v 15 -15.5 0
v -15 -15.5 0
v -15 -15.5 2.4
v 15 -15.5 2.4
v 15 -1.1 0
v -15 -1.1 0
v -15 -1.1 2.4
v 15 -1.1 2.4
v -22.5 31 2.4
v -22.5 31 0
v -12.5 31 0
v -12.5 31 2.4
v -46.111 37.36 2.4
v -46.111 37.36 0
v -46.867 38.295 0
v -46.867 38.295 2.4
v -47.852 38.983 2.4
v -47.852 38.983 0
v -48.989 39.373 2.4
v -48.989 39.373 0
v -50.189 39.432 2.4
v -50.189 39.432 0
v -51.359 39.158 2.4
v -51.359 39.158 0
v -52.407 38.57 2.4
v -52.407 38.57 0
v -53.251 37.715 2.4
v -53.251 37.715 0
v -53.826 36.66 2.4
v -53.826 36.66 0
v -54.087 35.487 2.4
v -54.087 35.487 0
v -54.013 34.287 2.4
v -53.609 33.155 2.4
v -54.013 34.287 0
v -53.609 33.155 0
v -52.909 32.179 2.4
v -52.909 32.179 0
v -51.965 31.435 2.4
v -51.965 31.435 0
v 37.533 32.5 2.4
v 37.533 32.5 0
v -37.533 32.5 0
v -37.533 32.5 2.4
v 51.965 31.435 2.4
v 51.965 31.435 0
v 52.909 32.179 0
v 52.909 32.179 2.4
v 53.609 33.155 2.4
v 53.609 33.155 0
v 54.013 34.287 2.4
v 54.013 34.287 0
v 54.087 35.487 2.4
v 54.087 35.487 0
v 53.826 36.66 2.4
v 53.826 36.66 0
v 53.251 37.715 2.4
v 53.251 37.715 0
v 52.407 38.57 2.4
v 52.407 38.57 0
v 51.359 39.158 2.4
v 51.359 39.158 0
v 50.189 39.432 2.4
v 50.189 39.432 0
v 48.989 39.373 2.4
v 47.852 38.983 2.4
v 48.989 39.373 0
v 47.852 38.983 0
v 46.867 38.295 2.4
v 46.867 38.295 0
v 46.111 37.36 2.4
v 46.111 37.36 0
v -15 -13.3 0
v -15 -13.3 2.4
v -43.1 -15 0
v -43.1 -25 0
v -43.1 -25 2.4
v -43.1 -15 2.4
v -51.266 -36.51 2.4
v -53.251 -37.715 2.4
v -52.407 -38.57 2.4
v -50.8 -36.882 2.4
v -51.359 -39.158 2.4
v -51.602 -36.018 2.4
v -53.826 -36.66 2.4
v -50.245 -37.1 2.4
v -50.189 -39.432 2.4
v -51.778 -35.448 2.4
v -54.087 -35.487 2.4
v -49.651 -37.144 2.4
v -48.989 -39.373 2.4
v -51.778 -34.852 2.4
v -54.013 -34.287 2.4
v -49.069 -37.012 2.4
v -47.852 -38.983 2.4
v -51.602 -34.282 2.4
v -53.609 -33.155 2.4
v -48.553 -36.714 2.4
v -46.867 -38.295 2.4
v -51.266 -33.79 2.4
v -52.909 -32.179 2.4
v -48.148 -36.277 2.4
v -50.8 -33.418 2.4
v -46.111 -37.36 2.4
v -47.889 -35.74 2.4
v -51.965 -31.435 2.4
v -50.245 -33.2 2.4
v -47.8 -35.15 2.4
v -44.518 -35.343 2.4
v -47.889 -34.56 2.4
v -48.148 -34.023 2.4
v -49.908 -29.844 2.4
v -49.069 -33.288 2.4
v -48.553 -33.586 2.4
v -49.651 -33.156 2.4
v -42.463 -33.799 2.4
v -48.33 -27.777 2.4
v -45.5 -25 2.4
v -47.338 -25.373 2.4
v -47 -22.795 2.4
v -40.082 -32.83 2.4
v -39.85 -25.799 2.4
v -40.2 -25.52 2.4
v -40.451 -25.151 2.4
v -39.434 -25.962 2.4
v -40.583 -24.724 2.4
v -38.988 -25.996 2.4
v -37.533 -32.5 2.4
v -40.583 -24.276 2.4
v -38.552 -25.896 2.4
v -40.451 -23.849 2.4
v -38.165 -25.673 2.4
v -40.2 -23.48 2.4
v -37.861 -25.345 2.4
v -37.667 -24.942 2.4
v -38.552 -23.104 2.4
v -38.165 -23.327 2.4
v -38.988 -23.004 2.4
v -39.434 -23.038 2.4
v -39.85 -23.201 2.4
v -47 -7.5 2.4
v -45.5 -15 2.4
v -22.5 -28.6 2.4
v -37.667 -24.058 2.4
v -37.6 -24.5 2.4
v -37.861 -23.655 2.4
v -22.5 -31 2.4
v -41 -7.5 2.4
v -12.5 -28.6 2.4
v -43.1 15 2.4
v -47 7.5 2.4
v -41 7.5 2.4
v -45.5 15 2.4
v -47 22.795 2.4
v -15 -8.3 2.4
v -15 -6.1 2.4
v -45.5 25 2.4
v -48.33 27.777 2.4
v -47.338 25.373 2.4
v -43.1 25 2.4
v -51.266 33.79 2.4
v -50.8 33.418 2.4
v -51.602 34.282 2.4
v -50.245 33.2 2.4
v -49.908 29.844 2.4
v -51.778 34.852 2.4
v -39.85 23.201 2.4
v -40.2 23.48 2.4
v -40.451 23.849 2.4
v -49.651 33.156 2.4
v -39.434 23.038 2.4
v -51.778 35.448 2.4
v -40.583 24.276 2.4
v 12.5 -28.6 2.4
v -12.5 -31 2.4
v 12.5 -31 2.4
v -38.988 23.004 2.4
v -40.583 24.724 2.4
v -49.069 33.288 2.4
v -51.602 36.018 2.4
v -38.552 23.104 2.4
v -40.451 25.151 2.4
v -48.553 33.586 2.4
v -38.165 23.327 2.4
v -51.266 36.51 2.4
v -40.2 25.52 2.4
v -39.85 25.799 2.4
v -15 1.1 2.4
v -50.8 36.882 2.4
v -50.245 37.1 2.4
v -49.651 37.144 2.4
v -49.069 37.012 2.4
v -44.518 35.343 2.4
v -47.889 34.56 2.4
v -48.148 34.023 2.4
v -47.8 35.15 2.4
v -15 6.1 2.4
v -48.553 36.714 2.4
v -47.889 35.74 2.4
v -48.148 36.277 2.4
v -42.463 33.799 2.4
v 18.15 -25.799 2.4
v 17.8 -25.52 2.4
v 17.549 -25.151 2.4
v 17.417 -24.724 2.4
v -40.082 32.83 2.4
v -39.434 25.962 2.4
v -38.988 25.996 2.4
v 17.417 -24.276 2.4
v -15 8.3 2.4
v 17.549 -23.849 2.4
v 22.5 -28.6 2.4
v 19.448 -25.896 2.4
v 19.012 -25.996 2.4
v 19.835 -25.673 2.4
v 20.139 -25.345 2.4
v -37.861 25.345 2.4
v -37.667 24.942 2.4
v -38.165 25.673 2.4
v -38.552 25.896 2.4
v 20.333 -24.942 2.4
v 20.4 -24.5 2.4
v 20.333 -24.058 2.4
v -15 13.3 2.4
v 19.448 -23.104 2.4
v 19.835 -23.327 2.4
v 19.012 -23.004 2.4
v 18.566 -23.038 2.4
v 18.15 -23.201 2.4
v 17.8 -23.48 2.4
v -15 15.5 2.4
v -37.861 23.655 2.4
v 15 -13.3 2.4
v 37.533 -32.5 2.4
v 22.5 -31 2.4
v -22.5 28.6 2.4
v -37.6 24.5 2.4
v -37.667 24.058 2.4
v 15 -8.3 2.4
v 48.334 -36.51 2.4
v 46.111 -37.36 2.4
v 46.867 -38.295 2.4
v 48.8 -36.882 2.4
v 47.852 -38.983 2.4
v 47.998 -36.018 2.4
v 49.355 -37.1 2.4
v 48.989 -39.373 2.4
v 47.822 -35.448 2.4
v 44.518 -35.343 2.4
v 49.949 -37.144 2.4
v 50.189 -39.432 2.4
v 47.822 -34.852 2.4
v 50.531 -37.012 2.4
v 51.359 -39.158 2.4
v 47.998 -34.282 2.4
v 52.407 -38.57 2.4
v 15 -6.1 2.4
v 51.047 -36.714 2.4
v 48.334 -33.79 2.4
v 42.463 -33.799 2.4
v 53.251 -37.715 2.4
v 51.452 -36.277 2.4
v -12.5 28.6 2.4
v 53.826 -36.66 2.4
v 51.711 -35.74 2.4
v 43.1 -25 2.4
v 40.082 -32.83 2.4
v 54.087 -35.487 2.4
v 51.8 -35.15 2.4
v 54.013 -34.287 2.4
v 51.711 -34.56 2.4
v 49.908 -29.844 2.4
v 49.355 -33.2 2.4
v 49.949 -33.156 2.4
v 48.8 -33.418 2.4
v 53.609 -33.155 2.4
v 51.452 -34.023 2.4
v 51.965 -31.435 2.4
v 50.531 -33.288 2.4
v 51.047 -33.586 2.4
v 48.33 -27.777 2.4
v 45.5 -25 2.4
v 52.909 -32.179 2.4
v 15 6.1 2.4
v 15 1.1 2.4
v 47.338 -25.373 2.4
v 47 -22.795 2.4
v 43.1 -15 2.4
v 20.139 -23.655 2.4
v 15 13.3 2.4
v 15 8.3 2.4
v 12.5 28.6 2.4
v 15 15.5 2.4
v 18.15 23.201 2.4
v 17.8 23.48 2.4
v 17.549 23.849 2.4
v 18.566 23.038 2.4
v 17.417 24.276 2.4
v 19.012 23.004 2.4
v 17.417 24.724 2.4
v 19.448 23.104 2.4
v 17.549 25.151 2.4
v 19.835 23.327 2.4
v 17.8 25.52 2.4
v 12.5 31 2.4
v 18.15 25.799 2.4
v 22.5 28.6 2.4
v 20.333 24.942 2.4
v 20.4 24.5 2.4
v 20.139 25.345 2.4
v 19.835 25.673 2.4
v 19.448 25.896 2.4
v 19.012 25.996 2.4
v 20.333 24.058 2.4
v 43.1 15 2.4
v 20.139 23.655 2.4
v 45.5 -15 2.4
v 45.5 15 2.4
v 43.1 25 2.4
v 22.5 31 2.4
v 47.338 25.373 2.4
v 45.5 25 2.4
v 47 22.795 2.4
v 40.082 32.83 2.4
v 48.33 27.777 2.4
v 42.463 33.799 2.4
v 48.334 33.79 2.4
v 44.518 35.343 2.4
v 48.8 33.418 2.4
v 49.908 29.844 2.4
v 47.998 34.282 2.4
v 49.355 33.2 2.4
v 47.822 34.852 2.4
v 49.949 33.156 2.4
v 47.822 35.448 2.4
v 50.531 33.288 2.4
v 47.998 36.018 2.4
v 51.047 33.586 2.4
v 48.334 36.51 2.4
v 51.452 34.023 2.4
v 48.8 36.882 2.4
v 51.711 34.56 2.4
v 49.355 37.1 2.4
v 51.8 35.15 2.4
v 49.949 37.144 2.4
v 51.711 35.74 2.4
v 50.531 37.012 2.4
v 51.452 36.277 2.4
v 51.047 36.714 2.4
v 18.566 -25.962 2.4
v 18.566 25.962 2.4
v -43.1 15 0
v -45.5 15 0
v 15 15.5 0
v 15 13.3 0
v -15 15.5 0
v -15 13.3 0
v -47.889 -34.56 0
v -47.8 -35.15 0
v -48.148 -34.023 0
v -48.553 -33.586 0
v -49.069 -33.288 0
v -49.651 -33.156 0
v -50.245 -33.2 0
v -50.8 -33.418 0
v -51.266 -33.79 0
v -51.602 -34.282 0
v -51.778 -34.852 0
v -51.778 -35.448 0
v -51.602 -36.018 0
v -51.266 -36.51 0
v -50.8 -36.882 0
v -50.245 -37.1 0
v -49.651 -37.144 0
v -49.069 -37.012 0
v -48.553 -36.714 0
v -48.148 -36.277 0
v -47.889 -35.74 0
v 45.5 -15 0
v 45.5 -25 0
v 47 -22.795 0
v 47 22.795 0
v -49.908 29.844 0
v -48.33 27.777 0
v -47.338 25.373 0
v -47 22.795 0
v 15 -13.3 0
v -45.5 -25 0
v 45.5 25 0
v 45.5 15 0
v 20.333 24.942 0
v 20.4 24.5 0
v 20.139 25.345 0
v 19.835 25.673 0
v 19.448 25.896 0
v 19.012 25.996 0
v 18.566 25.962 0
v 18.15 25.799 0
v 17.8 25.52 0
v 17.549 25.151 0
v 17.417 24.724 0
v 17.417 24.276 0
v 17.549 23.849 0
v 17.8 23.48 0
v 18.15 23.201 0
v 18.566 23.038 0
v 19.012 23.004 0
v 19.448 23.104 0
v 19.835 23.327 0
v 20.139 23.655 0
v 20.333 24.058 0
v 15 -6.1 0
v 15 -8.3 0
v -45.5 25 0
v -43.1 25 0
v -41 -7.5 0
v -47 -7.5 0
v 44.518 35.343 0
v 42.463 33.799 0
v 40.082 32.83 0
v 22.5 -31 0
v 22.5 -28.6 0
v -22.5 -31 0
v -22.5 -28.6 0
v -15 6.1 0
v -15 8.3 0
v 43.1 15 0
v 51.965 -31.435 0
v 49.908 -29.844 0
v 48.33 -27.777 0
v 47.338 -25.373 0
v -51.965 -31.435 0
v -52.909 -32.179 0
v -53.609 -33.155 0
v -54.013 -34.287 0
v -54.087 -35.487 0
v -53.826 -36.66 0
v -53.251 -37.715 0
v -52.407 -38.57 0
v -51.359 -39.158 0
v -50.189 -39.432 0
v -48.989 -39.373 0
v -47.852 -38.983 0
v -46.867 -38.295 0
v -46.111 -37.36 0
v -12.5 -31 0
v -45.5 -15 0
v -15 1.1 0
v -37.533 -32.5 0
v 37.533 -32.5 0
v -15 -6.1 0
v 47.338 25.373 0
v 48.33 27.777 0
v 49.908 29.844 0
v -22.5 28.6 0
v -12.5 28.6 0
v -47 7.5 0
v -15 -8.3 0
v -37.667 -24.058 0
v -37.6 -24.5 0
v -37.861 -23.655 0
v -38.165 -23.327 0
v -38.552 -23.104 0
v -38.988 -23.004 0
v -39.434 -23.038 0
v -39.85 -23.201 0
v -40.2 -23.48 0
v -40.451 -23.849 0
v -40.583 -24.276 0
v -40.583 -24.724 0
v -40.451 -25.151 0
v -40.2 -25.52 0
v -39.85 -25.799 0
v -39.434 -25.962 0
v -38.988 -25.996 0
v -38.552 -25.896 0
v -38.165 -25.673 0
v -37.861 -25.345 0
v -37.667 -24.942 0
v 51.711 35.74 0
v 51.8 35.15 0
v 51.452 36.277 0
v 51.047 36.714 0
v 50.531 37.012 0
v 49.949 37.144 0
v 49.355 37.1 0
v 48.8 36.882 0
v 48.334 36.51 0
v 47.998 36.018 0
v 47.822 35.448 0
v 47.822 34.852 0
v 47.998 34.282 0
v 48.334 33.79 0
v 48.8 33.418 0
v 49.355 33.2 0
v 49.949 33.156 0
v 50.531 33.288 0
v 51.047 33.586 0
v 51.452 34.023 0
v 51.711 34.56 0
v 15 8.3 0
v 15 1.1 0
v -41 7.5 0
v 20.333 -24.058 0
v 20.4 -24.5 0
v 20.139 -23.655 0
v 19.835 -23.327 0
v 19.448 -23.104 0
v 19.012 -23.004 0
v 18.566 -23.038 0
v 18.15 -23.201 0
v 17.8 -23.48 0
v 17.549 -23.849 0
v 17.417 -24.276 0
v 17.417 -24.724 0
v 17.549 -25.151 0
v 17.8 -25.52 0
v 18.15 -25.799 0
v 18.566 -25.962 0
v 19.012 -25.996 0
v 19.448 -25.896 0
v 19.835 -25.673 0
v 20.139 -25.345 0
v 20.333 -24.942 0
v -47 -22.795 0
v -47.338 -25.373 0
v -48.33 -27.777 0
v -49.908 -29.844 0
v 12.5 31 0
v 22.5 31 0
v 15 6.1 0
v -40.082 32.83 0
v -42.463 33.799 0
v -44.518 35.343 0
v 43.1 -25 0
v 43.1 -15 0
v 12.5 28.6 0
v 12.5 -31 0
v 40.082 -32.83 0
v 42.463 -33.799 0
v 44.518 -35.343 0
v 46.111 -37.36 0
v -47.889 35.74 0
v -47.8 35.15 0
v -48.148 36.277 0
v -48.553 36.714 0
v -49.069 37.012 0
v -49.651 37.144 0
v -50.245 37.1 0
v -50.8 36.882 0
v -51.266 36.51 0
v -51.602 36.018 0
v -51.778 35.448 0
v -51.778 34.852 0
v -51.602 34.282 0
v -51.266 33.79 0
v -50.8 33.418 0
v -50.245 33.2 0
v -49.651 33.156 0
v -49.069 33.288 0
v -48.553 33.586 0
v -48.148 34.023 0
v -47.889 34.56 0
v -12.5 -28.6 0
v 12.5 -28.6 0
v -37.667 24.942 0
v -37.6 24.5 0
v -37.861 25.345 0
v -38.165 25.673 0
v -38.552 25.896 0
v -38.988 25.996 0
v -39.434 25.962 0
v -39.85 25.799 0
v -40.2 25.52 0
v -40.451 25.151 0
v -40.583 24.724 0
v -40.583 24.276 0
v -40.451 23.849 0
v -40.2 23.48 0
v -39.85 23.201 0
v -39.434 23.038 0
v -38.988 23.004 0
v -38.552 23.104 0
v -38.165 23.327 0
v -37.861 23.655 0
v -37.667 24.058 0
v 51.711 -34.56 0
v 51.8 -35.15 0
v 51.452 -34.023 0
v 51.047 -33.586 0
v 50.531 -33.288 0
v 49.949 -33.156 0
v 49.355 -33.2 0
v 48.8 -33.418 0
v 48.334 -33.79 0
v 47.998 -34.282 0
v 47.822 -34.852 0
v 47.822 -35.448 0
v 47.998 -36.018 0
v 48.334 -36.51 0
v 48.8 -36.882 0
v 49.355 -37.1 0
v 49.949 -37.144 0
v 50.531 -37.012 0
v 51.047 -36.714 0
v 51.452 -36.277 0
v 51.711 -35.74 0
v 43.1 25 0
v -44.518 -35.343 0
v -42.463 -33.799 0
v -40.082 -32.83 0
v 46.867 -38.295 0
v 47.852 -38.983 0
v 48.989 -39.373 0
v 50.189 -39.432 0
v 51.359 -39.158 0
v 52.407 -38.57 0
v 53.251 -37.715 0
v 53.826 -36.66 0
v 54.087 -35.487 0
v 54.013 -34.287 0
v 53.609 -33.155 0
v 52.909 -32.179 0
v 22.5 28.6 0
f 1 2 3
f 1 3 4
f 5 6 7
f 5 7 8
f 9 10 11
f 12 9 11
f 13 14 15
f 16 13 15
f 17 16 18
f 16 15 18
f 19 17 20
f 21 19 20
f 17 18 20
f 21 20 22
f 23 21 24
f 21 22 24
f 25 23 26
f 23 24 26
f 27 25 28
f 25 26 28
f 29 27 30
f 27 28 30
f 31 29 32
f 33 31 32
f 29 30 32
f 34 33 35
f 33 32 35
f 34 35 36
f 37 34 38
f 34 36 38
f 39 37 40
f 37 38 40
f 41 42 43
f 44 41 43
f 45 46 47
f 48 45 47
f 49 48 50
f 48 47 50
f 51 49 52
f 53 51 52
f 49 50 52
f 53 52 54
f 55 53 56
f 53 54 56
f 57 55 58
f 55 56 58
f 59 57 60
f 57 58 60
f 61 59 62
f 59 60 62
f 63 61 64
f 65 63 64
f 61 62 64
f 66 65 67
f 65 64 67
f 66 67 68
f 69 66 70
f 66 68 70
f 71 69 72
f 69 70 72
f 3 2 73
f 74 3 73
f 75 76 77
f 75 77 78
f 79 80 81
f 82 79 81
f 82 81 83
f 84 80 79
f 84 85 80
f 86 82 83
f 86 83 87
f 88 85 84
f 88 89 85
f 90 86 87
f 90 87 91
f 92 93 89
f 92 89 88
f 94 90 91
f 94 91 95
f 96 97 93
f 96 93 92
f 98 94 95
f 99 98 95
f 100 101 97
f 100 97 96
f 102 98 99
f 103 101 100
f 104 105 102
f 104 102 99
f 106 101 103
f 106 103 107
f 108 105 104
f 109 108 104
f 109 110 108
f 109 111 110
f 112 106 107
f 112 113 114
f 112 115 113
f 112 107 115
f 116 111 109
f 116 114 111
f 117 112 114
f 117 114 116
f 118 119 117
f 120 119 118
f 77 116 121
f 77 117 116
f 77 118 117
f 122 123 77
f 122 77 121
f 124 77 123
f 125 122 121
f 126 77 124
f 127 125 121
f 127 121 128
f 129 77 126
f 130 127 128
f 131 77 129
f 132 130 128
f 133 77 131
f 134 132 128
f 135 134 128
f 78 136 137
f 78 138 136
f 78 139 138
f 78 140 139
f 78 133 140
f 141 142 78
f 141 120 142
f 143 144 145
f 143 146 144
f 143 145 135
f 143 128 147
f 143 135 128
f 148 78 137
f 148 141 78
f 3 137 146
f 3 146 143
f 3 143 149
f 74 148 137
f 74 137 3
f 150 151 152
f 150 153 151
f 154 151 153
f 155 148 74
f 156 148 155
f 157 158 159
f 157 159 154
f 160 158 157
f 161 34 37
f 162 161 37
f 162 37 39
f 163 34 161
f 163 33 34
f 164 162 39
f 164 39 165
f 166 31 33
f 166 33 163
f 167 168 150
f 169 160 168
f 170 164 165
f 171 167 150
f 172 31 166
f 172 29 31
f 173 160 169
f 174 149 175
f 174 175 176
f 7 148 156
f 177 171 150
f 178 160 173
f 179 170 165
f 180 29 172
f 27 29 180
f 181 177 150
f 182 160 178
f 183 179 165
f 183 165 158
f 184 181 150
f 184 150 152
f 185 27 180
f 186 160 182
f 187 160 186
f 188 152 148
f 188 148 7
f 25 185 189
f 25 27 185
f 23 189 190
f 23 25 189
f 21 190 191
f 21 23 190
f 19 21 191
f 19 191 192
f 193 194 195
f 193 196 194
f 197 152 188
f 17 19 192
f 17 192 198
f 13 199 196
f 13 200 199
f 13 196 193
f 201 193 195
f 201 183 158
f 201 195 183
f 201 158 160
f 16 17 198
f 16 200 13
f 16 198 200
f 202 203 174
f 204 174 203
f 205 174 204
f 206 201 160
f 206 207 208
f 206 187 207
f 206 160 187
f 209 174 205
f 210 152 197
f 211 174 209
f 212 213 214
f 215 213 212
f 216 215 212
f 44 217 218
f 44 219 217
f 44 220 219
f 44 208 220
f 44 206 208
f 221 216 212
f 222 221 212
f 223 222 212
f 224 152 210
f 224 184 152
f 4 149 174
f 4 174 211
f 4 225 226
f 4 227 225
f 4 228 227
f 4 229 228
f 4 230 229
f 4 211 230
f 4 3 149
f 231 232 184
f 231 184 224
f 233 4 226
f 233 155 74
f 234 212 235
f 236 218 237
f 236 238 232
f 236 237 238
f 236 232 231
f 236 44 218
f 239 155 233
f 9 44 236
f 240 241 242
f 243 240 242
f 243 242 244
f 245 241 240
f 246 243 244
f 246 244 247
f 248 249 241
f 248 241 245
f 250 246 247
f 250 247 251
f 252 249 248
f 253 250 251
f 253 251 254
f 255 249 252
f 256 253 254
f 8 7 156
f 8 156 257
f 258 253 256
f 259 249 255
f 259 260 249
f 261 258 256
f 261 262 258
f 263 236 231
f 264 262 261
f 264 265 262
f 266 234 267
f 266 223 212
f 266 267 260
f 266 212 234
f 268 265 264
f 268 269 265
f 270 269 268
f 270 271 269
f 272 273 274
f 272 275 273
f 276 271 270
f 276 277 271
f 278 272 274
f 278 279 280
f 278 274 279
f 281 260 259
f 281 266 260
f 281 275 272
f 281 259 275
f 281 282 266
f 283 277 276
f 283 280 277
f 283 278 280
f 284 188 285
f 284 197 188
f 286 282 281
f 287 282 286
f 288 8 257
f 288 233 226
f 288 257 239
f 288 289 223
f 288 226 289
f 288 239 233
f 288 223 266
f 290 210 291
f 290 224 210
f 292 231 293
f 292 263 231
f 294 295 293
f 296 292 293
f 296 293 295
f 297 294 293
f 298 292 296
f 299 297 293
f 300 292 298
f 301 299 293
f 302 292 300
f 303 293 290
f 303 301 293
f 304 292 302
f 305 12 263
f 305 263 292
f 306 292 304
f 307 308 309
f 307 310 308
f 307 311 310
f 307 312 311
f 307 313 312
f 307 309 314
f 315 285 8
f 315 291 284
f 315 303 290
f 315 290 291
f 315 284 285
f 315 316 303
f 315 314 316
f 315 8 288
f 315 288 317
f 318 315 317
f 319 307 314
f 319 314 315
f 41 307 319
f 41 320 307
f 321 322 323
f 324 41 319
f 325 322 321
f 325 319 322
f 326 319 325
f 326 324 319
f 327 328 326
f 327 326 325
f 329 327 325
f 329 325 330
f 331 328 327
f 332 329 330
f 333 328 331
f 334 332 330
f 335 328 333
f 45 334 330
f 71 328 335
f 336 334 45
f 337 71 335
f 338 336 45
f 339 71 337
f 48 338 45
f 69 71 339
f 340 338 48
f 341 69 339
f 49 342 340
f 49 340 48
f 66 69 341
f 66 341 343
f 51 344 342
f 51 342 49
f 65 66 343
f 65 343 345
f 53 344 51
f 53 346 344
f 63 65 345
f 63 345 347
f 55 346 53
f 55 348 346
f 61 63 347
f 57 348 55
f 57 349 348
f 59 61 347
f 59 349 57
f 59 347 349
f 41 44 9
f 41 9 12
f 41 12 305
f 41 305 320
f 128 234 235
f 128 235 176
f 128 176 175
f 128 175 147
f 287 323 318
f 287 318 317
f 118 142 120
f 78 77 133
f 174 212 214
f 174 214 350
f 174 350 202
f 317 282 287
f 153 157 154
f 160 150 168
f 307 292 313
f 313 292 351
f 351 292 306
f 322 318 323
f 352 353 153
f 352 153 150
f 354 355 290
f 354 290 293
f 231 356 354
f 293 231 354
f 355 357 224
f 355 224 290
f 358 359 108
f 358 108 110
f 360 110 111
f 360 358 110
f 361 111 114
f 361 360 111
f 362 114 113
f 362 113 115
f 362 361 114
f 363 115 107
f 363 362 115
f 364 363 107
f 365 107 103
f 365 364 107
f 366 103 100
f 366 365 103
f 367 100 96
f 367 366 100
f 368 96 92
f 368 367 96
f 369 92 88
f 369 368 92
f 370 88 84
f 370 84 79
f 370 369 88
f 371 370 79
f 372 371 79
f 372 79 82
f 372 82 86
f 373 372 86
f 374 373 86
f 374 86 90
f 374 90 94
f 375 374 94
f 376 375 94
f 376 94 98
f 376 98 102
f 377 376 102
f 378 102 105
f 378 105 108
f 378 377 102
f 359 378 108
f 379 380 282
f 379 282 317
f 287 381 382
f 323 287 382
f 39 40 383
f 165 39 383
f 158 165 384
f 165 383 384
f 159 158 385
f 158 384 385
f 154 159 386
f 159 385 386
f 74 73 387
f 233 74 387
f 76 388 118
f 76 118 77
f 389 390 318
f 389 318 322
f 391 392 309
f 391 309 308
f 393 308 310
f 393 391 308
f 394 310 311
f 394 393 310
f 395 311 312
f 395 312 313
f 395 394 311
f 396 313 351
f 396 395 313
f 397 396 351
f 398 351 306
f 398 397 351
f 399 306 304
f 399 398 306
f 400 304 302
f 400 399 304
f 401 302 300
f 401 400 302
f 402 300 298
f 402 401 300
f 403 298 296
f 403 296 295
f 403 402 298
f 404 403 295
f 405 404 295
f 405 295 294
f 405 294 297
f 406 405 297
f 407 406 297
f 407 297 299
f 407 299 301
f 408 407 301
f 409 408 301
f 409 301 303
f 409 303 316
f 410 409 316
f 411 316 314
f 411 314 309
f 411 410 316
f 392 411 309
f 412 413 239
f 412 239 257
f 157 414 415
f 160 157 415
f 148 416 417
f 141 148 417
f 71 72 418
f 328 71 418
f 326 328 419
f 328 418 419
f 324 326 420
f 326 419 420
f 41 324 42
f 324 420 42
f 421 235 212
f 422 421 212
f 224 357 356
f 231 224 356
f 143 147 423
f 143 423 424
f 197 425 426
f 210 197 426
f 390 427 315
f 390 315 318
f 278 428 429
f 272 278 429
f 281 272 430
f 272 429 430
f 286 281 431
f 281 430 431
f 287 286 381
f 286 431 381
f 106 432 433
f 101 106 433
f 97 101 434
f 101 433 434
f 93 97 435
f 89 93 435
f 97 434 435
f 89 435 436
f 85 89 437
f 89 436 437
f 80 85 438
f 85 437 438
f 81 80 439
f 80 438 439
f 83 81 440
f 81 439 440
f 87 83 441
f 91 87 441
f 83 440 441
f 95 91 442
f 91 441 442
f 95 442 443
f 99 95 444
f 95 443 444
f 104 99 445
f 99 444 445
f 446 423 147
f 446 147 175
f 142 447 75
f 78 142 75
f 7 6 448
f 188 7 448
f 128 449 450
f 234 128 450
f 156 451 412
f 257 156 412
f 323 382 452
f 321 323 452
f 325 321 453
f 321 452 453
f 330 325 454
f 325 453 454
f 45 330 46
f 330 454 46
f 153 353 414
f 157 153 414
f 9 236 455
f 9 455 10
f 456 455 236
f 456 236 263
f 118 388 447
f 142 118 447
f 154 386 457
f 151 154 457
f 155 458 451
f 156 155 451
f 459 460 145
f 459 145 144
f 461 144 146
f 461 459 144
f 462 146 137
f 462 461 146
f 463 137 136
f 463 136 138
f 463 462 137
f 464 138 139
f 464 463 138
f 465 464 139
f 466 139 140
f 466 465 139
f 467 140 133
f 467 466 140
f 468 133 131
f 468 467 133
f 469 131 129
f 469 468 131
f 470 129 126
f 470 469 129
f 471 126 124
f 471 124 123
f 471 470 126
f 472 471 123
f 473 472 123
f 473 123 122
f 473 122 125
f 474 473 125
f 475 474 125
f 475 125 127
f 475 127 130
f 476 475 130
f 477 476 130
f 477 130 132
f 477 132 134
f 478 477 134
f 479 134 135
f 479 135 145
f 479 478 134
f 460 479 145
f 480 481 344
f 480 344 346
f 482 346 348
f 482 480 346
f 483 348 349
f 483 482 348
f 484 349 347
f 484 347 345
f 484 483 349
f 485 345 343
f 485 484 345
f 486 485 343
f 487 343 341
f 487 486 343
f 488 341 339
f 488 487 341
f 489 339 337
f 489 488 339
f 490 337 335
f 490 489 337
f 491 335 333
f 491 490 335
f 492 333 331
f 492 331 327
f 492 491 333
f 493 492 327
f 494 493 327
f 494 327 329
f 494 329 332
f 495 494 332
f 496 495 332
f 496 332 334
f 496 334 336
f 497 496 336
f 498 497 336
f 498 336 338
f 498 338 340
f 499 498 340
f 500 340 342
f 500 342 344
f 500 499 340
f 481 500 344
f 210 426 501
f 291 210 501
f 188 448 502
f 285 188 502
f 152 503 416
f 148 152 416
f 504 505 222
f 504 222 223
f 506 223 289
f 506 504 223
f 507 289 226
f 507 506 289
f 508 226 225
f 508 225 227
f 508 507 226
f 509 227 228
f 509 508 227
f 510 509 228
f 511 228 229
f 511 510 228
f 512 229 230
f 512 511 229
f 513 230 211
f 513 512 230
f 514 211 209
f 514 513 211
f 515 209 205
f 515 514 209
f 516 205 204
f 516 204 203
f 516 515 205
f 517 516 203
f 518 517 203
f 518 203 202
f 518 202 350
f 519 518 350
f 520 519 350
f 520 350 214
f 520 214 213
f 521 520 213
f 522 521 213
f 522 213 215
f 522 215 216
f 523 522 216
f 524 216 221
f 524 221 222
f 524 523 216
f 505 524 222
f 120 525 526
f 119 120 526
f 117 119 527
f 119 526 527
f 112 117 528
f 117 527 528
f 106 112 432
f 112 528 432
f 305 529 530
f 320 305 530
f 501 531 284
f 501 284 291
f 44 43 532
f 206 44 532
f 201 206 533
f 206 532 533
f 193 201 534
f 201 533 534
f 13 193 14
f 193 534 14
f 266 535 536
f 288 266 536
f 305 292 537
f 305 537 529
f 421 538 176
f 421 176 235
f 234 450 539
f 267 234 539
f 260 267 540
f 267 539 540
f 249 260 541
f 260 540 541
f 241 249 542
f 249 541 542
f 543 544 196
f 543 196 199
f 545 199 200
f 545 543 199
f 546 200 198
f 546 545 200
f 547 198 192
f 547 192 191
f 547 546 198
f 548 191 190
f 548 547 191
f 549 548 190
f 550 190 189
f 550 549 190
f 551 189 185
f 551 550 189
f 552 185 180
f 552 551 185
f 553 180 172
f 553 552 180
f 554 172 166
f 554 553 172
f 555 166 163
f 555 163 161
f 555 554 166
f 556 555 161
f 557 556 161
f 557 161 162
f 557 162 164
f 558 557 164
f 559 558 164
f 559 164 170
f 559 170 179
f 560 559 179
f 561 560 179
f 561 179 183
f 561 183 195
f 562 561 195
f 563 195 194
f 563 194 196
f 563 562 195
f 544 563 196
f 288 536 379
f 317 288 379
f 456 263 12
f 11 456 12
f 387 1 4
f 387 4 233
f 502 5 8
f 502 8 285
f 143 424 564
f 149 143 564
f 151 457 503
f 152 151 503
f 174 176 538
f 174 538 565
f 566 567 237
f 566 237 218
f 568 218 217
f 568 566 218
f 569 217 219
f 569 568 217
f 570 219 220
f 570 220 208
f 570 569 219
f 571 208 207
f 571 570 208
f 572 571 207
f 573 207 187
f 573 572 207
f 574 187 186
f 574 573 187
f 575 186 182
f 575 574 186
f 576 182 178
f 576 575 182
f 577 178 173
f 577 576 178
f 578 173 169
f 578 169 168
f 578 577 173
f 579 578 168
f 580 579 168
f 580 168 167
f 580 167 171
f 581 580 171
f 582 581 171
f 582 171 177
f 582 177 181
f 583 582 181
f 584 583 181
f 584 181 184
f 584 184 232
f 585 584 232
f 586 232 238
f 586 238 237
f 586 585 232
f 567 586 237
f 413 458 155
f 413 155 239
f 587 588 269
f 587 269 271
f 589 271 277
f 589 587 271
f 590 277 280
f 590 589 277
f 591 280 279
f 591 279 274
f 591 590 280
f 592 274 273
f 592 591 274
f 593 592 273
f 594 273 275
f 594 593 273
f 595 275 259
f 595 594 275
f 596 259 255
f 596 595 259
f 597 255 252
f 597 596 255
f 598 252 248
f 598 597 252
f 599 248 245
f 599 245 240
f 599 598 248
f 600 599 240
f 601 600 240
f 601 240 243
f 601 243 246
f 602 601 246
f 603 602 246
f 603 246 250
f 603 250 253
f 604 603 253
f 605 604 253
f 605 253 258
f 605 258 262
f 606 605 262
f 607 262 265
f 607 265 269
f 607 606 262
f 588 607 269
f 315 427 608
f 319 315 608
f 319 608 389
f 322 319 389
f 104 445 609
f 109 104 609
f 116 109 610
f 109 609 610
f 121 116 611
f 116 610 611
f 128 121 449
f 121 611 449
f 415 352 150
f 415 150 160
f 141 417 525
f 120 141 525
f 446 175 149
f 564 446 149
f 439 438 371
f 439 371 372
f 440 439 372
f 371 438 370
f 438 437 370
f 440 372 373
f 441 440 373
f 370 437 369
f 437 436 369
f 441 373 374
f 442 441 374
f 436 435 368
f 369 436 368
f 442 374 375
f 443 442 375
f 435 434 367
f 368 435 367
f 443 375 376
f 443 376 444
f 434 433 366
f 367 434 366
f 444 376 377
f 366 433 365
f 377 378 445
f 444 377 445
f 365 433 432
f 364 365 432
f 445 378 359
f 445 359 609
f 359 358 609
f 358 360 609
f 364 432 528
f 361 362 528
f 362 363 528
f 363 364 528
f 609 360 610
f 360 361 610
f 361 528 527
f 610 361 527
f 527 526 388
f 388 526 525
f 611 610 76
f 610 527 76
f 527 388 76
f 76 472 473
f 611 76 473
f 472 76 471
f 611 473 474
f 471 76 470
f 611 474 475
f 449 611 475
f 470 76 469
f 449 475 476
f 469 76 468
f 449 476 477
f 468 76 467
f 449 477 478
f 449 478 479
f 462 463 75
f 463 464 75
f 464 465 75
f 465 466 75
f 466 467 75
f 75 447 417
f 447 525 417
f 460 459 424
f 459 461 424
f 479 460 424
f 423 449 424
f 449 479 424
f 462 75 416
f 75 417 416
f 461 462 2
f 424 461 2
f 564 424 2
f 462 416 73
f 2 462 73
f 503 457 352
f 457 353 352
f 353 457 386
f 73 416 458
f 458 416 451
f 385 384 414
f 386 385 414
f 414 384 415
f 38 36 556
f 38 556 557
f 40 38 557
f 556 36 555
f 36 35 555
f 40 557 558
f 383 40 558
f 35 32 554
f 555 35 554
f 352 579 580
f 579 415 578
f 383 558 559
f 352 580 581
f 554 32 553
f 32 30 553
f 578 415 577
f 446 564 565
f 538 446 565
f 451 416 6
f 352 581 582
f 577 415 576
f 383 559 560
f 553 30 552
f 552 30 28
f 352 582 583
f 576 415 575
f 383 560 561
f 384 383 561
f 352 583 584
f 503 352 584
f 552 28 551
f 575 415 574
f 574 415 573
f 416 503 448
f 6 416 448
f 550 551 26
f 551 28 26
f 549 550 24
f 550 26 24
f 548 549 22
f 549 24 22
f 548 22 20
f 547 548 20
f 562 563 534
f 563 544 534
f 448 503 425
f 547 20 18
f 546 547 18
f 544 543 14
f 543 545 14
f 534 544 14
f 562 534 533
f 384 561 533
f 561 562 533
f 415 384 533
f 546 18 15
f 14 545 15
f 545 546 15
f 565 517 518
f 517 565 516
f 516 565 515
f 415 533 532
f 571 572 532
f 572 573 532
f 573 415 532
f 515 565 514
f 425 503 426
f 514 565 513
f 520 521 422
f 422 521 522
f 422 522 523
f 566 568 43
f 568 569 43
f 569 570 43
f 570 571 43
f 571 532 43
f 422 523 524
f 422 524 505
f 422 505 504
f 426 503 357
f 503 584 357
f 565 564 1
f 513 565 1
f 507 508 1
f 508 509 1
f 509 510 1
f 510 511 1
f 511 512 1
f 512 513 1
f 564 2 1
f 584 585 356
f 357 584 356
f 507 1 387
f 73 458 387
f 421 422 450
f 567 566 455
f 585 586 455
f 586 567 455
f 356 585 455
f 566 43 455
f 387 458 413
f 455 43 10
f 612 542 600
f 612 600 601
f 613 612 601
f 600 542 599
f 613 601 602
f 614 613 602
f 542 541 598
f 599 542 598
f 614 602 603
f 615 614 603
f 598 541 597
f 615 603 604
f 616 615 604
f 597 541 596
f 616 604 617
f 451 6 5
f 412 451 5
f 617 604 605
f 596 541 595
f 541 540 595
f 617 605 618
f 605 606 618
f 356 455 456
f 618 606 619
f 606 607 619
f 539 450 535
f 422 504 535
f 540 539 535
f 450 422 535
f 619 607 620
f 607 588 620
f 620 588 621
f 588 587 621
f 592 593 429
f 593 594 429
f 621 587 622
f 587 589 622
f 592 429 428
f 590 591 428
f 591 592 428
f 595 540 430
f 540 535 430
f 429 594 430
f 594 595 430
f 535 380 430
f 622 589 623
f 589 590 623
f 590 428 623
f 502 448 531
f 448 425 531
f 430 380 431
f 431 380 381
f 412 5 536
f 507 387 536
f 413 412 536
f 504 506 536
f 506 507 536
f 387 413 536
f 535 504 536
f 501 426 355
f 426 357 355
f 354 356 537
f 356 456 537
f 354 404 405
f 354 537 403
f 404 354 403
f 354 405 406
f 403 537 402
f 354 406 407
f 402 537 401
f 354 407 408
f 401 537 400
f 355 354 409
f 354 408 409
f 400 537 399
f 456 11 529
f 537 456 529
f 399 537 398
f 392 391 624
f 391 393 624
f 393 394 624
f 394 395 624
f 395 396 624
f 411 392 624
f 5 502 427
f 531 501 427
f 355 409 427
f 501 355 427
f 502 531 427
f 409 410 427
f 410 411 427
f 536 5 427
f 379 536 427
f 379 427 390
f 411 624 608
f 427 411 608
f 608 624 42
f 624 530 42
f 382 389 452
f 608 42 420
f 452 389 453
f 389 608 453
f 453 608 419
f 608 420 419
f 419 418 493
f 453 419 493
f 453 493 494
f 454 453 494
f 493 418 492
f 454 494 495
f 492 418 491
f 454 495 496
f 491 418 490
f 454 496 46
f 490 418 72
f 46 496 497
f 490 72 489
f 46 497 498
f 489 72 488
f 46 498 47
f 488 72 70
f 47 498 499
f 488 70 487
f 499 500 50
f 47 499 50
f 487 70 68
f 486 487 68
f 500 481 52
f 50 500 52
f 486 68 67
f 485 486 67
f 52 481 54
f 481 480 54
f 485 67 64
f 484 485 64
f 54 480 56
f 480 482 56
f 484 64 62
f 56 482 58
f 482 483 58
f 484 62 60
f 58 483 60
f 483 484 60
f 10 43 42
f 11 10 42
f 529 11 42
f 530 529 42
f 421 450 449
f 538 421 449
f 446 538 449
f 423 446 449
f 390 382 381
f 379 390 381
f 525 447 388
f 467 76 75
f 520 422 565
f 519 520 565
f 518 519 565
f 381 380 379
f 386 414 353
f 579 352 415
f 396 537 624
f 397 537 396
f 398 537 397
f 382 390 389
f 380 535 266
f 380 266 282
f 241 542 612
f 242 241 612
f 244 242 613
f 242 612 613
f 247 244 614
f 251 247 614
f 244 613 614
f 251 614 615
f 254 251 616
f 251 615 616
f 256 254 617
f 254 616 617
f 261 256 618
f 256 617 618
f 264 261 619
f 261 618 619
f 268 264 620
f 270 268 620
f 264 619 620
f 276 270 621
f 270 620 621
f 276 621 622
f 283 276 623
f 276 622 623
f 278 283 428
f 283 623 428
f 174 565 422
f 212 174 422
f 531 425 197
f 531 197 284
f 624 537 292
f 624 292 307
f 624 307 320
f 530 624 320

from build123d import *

# Parameters (mm, degrees)
F0_R     = 2
F0_W     = 2.4
F0_H     = 10
F0_R_2   = 1.5
F0_W_2   = 10
F0_H_2   = 2.4
F0_W_3   = 30
F0_H_3   = 2.2
F1_DEPTH = 2.4


with BuildPart() as f1:
    # F0 (on Top) → F1 (new body)
    with BuildSketch(Plane.XY):
        with BuildLine():
            ThreePointArc((46.111466, 37.36014), (42.463054, 33.799465), (37.533481, 32.5))
            Line((37.533481, 32.5), (-37.533481, 32.5))
            ThreePointArc((-37.533481, 32.5), (-42.463054, 33.799465), (-46.111466, 37.36014))
            ThreePointArc((-46.111466, 37.36014), (-52.859026, 38.171979), (-51.965035, 31.434812))
            ThreePointArc((-51.965035, 31.434812), (-48.329658, 27.777326), (-47, 22.794839))
            Line((-47, 22.794839), (-47, 7.5))
            Line((-47, 7.5), (-41, 7.5))
            Line((-41, 7.5), (-41, -7.5))
            Line((-41, -7.5), (-47, -7.5))
            Line((-47, -7.5), (-47, -22.794839))
            ThreePointArc((-47, -22.794839), (-48.329658, -27.777326), (-51.965035, -31.434812))
            ThreePointArc((-51.965035, -31.434812), (-52.859026, -38.171979), (-46.111466, -37.36014))
            ThreePointArc((-46.111466, -37.36014), (-42.463054, -33.799465), (-37.533481, -32.5))
            Line((-37.533481, -32.5), (37.533481, -32.5))
            ThreePointArc((37.533481, -32.5), (42.463054, -33.799465), (46.111466, -37.36014))
            ThreePointArc((46.111466, -37.36014), (52.859026, -38.171979), (51.965035, -31.434812))
            ThreePointArc((51.965035, -31.434812), (48.329658, -27.777326), (47, -22.794839))
            Line((47, -22.794839), (47, 22.794839))
            ThreePointArc((47, 22.794839), (48.329658, 27.777326), (51.965035, 31.434812))
            ThreePointArc((51.965035, 31.434812), (52.859026, 38.171979), (46.111466, 37.36014))
        make_face()
        with Locations((-49.8, -35.15)):
            Circle(F0_R, mode=Mode.SUBTRACT)
        with Locations((-44.3, -20)):
            Rectangle(F0_W, F0_H, mode=Mode.SUBTRACT)
        with Locations((-39.1, -24.5)):
            Circle(F0_R_2, mode=Mode.SUBTRACT)
        with Locations((-17.5, -29.8)):
            Rectangle(F0_W_2, F0_H_2, mode=Mode.SUBTRACT)
        with Locations((17.5, -29.8)):
            Rectangle(F0_W_2, F0_H_2, mode=Mode.SUBTRACT)
        with Locations((18.9, -24.5)):
            Circle(F0_R_2, mode=Mode.SUBTRACT)
        with Locations((49.8, -35.15)):
            Circle(F0_R, mode=Mode.SUBTRACT)
        with Locations((44.3, -20)):
            Rectangle(F0_W, F0_H, mode=Mode.SUBTRACT)
        with Locations((0, -14.4)):
            Rectangle(F0_W_3, F0_H_3, mode=Mode.SUBTRACT)
        with Locations((0, -7.2)):
            Rectangle(F0_W_3, F0_H_3, mode=Mode.SUBTRACT)
        with Locations((-44.3, 20)):
            Rectangle(F0_W, F0_H, mode=Mode.SUBTRACT)
        with Locations((-39.1, 24.5)):
            Circle(F0_R_2, mode=Mode.SUBTRACT)
        with Locations((-49.8, 35.15)):
            Circle(F0_R, mode=Mode.SUBTRACT)
        with Locations((-17.5, 29.8)):
            Rectangle(F0_W_2, F0_H_2, mode=Mode.SUBTRACT)
        Rectangle(F0_W_3, F0_H_3, mode=Mode.SUBTRACT)
        with Locations((0, 7.2)):
            Rectangle(F0_W_3, F0_H_3, mode=Mode.SUBTRACT)
        with Locations((0, 14.4)):
            Rectangle(F0_W_3, F0_H_3, mode=Mode.SUBTRACT)
        with Locations((18.9, 24.5)):
            Circle(F0_R_2, mode=Mode.SUBTRACT)
        with Locations((17.5, 29.8)):
            Rectangle(F0_W_2, F0_H_2, mode=Mode.SUBTRACT)
        with Locations((44.3, 20)):
            Rectangle(F0_W, F0_H, mode=Mode.SUBTRACT)
        with Locations((49.8, 35.15)):
            Circle(F0_R, mode=Mode.SUBTRACT)
    extrude(amount=F1_DEPTH)


solid = f1.part
